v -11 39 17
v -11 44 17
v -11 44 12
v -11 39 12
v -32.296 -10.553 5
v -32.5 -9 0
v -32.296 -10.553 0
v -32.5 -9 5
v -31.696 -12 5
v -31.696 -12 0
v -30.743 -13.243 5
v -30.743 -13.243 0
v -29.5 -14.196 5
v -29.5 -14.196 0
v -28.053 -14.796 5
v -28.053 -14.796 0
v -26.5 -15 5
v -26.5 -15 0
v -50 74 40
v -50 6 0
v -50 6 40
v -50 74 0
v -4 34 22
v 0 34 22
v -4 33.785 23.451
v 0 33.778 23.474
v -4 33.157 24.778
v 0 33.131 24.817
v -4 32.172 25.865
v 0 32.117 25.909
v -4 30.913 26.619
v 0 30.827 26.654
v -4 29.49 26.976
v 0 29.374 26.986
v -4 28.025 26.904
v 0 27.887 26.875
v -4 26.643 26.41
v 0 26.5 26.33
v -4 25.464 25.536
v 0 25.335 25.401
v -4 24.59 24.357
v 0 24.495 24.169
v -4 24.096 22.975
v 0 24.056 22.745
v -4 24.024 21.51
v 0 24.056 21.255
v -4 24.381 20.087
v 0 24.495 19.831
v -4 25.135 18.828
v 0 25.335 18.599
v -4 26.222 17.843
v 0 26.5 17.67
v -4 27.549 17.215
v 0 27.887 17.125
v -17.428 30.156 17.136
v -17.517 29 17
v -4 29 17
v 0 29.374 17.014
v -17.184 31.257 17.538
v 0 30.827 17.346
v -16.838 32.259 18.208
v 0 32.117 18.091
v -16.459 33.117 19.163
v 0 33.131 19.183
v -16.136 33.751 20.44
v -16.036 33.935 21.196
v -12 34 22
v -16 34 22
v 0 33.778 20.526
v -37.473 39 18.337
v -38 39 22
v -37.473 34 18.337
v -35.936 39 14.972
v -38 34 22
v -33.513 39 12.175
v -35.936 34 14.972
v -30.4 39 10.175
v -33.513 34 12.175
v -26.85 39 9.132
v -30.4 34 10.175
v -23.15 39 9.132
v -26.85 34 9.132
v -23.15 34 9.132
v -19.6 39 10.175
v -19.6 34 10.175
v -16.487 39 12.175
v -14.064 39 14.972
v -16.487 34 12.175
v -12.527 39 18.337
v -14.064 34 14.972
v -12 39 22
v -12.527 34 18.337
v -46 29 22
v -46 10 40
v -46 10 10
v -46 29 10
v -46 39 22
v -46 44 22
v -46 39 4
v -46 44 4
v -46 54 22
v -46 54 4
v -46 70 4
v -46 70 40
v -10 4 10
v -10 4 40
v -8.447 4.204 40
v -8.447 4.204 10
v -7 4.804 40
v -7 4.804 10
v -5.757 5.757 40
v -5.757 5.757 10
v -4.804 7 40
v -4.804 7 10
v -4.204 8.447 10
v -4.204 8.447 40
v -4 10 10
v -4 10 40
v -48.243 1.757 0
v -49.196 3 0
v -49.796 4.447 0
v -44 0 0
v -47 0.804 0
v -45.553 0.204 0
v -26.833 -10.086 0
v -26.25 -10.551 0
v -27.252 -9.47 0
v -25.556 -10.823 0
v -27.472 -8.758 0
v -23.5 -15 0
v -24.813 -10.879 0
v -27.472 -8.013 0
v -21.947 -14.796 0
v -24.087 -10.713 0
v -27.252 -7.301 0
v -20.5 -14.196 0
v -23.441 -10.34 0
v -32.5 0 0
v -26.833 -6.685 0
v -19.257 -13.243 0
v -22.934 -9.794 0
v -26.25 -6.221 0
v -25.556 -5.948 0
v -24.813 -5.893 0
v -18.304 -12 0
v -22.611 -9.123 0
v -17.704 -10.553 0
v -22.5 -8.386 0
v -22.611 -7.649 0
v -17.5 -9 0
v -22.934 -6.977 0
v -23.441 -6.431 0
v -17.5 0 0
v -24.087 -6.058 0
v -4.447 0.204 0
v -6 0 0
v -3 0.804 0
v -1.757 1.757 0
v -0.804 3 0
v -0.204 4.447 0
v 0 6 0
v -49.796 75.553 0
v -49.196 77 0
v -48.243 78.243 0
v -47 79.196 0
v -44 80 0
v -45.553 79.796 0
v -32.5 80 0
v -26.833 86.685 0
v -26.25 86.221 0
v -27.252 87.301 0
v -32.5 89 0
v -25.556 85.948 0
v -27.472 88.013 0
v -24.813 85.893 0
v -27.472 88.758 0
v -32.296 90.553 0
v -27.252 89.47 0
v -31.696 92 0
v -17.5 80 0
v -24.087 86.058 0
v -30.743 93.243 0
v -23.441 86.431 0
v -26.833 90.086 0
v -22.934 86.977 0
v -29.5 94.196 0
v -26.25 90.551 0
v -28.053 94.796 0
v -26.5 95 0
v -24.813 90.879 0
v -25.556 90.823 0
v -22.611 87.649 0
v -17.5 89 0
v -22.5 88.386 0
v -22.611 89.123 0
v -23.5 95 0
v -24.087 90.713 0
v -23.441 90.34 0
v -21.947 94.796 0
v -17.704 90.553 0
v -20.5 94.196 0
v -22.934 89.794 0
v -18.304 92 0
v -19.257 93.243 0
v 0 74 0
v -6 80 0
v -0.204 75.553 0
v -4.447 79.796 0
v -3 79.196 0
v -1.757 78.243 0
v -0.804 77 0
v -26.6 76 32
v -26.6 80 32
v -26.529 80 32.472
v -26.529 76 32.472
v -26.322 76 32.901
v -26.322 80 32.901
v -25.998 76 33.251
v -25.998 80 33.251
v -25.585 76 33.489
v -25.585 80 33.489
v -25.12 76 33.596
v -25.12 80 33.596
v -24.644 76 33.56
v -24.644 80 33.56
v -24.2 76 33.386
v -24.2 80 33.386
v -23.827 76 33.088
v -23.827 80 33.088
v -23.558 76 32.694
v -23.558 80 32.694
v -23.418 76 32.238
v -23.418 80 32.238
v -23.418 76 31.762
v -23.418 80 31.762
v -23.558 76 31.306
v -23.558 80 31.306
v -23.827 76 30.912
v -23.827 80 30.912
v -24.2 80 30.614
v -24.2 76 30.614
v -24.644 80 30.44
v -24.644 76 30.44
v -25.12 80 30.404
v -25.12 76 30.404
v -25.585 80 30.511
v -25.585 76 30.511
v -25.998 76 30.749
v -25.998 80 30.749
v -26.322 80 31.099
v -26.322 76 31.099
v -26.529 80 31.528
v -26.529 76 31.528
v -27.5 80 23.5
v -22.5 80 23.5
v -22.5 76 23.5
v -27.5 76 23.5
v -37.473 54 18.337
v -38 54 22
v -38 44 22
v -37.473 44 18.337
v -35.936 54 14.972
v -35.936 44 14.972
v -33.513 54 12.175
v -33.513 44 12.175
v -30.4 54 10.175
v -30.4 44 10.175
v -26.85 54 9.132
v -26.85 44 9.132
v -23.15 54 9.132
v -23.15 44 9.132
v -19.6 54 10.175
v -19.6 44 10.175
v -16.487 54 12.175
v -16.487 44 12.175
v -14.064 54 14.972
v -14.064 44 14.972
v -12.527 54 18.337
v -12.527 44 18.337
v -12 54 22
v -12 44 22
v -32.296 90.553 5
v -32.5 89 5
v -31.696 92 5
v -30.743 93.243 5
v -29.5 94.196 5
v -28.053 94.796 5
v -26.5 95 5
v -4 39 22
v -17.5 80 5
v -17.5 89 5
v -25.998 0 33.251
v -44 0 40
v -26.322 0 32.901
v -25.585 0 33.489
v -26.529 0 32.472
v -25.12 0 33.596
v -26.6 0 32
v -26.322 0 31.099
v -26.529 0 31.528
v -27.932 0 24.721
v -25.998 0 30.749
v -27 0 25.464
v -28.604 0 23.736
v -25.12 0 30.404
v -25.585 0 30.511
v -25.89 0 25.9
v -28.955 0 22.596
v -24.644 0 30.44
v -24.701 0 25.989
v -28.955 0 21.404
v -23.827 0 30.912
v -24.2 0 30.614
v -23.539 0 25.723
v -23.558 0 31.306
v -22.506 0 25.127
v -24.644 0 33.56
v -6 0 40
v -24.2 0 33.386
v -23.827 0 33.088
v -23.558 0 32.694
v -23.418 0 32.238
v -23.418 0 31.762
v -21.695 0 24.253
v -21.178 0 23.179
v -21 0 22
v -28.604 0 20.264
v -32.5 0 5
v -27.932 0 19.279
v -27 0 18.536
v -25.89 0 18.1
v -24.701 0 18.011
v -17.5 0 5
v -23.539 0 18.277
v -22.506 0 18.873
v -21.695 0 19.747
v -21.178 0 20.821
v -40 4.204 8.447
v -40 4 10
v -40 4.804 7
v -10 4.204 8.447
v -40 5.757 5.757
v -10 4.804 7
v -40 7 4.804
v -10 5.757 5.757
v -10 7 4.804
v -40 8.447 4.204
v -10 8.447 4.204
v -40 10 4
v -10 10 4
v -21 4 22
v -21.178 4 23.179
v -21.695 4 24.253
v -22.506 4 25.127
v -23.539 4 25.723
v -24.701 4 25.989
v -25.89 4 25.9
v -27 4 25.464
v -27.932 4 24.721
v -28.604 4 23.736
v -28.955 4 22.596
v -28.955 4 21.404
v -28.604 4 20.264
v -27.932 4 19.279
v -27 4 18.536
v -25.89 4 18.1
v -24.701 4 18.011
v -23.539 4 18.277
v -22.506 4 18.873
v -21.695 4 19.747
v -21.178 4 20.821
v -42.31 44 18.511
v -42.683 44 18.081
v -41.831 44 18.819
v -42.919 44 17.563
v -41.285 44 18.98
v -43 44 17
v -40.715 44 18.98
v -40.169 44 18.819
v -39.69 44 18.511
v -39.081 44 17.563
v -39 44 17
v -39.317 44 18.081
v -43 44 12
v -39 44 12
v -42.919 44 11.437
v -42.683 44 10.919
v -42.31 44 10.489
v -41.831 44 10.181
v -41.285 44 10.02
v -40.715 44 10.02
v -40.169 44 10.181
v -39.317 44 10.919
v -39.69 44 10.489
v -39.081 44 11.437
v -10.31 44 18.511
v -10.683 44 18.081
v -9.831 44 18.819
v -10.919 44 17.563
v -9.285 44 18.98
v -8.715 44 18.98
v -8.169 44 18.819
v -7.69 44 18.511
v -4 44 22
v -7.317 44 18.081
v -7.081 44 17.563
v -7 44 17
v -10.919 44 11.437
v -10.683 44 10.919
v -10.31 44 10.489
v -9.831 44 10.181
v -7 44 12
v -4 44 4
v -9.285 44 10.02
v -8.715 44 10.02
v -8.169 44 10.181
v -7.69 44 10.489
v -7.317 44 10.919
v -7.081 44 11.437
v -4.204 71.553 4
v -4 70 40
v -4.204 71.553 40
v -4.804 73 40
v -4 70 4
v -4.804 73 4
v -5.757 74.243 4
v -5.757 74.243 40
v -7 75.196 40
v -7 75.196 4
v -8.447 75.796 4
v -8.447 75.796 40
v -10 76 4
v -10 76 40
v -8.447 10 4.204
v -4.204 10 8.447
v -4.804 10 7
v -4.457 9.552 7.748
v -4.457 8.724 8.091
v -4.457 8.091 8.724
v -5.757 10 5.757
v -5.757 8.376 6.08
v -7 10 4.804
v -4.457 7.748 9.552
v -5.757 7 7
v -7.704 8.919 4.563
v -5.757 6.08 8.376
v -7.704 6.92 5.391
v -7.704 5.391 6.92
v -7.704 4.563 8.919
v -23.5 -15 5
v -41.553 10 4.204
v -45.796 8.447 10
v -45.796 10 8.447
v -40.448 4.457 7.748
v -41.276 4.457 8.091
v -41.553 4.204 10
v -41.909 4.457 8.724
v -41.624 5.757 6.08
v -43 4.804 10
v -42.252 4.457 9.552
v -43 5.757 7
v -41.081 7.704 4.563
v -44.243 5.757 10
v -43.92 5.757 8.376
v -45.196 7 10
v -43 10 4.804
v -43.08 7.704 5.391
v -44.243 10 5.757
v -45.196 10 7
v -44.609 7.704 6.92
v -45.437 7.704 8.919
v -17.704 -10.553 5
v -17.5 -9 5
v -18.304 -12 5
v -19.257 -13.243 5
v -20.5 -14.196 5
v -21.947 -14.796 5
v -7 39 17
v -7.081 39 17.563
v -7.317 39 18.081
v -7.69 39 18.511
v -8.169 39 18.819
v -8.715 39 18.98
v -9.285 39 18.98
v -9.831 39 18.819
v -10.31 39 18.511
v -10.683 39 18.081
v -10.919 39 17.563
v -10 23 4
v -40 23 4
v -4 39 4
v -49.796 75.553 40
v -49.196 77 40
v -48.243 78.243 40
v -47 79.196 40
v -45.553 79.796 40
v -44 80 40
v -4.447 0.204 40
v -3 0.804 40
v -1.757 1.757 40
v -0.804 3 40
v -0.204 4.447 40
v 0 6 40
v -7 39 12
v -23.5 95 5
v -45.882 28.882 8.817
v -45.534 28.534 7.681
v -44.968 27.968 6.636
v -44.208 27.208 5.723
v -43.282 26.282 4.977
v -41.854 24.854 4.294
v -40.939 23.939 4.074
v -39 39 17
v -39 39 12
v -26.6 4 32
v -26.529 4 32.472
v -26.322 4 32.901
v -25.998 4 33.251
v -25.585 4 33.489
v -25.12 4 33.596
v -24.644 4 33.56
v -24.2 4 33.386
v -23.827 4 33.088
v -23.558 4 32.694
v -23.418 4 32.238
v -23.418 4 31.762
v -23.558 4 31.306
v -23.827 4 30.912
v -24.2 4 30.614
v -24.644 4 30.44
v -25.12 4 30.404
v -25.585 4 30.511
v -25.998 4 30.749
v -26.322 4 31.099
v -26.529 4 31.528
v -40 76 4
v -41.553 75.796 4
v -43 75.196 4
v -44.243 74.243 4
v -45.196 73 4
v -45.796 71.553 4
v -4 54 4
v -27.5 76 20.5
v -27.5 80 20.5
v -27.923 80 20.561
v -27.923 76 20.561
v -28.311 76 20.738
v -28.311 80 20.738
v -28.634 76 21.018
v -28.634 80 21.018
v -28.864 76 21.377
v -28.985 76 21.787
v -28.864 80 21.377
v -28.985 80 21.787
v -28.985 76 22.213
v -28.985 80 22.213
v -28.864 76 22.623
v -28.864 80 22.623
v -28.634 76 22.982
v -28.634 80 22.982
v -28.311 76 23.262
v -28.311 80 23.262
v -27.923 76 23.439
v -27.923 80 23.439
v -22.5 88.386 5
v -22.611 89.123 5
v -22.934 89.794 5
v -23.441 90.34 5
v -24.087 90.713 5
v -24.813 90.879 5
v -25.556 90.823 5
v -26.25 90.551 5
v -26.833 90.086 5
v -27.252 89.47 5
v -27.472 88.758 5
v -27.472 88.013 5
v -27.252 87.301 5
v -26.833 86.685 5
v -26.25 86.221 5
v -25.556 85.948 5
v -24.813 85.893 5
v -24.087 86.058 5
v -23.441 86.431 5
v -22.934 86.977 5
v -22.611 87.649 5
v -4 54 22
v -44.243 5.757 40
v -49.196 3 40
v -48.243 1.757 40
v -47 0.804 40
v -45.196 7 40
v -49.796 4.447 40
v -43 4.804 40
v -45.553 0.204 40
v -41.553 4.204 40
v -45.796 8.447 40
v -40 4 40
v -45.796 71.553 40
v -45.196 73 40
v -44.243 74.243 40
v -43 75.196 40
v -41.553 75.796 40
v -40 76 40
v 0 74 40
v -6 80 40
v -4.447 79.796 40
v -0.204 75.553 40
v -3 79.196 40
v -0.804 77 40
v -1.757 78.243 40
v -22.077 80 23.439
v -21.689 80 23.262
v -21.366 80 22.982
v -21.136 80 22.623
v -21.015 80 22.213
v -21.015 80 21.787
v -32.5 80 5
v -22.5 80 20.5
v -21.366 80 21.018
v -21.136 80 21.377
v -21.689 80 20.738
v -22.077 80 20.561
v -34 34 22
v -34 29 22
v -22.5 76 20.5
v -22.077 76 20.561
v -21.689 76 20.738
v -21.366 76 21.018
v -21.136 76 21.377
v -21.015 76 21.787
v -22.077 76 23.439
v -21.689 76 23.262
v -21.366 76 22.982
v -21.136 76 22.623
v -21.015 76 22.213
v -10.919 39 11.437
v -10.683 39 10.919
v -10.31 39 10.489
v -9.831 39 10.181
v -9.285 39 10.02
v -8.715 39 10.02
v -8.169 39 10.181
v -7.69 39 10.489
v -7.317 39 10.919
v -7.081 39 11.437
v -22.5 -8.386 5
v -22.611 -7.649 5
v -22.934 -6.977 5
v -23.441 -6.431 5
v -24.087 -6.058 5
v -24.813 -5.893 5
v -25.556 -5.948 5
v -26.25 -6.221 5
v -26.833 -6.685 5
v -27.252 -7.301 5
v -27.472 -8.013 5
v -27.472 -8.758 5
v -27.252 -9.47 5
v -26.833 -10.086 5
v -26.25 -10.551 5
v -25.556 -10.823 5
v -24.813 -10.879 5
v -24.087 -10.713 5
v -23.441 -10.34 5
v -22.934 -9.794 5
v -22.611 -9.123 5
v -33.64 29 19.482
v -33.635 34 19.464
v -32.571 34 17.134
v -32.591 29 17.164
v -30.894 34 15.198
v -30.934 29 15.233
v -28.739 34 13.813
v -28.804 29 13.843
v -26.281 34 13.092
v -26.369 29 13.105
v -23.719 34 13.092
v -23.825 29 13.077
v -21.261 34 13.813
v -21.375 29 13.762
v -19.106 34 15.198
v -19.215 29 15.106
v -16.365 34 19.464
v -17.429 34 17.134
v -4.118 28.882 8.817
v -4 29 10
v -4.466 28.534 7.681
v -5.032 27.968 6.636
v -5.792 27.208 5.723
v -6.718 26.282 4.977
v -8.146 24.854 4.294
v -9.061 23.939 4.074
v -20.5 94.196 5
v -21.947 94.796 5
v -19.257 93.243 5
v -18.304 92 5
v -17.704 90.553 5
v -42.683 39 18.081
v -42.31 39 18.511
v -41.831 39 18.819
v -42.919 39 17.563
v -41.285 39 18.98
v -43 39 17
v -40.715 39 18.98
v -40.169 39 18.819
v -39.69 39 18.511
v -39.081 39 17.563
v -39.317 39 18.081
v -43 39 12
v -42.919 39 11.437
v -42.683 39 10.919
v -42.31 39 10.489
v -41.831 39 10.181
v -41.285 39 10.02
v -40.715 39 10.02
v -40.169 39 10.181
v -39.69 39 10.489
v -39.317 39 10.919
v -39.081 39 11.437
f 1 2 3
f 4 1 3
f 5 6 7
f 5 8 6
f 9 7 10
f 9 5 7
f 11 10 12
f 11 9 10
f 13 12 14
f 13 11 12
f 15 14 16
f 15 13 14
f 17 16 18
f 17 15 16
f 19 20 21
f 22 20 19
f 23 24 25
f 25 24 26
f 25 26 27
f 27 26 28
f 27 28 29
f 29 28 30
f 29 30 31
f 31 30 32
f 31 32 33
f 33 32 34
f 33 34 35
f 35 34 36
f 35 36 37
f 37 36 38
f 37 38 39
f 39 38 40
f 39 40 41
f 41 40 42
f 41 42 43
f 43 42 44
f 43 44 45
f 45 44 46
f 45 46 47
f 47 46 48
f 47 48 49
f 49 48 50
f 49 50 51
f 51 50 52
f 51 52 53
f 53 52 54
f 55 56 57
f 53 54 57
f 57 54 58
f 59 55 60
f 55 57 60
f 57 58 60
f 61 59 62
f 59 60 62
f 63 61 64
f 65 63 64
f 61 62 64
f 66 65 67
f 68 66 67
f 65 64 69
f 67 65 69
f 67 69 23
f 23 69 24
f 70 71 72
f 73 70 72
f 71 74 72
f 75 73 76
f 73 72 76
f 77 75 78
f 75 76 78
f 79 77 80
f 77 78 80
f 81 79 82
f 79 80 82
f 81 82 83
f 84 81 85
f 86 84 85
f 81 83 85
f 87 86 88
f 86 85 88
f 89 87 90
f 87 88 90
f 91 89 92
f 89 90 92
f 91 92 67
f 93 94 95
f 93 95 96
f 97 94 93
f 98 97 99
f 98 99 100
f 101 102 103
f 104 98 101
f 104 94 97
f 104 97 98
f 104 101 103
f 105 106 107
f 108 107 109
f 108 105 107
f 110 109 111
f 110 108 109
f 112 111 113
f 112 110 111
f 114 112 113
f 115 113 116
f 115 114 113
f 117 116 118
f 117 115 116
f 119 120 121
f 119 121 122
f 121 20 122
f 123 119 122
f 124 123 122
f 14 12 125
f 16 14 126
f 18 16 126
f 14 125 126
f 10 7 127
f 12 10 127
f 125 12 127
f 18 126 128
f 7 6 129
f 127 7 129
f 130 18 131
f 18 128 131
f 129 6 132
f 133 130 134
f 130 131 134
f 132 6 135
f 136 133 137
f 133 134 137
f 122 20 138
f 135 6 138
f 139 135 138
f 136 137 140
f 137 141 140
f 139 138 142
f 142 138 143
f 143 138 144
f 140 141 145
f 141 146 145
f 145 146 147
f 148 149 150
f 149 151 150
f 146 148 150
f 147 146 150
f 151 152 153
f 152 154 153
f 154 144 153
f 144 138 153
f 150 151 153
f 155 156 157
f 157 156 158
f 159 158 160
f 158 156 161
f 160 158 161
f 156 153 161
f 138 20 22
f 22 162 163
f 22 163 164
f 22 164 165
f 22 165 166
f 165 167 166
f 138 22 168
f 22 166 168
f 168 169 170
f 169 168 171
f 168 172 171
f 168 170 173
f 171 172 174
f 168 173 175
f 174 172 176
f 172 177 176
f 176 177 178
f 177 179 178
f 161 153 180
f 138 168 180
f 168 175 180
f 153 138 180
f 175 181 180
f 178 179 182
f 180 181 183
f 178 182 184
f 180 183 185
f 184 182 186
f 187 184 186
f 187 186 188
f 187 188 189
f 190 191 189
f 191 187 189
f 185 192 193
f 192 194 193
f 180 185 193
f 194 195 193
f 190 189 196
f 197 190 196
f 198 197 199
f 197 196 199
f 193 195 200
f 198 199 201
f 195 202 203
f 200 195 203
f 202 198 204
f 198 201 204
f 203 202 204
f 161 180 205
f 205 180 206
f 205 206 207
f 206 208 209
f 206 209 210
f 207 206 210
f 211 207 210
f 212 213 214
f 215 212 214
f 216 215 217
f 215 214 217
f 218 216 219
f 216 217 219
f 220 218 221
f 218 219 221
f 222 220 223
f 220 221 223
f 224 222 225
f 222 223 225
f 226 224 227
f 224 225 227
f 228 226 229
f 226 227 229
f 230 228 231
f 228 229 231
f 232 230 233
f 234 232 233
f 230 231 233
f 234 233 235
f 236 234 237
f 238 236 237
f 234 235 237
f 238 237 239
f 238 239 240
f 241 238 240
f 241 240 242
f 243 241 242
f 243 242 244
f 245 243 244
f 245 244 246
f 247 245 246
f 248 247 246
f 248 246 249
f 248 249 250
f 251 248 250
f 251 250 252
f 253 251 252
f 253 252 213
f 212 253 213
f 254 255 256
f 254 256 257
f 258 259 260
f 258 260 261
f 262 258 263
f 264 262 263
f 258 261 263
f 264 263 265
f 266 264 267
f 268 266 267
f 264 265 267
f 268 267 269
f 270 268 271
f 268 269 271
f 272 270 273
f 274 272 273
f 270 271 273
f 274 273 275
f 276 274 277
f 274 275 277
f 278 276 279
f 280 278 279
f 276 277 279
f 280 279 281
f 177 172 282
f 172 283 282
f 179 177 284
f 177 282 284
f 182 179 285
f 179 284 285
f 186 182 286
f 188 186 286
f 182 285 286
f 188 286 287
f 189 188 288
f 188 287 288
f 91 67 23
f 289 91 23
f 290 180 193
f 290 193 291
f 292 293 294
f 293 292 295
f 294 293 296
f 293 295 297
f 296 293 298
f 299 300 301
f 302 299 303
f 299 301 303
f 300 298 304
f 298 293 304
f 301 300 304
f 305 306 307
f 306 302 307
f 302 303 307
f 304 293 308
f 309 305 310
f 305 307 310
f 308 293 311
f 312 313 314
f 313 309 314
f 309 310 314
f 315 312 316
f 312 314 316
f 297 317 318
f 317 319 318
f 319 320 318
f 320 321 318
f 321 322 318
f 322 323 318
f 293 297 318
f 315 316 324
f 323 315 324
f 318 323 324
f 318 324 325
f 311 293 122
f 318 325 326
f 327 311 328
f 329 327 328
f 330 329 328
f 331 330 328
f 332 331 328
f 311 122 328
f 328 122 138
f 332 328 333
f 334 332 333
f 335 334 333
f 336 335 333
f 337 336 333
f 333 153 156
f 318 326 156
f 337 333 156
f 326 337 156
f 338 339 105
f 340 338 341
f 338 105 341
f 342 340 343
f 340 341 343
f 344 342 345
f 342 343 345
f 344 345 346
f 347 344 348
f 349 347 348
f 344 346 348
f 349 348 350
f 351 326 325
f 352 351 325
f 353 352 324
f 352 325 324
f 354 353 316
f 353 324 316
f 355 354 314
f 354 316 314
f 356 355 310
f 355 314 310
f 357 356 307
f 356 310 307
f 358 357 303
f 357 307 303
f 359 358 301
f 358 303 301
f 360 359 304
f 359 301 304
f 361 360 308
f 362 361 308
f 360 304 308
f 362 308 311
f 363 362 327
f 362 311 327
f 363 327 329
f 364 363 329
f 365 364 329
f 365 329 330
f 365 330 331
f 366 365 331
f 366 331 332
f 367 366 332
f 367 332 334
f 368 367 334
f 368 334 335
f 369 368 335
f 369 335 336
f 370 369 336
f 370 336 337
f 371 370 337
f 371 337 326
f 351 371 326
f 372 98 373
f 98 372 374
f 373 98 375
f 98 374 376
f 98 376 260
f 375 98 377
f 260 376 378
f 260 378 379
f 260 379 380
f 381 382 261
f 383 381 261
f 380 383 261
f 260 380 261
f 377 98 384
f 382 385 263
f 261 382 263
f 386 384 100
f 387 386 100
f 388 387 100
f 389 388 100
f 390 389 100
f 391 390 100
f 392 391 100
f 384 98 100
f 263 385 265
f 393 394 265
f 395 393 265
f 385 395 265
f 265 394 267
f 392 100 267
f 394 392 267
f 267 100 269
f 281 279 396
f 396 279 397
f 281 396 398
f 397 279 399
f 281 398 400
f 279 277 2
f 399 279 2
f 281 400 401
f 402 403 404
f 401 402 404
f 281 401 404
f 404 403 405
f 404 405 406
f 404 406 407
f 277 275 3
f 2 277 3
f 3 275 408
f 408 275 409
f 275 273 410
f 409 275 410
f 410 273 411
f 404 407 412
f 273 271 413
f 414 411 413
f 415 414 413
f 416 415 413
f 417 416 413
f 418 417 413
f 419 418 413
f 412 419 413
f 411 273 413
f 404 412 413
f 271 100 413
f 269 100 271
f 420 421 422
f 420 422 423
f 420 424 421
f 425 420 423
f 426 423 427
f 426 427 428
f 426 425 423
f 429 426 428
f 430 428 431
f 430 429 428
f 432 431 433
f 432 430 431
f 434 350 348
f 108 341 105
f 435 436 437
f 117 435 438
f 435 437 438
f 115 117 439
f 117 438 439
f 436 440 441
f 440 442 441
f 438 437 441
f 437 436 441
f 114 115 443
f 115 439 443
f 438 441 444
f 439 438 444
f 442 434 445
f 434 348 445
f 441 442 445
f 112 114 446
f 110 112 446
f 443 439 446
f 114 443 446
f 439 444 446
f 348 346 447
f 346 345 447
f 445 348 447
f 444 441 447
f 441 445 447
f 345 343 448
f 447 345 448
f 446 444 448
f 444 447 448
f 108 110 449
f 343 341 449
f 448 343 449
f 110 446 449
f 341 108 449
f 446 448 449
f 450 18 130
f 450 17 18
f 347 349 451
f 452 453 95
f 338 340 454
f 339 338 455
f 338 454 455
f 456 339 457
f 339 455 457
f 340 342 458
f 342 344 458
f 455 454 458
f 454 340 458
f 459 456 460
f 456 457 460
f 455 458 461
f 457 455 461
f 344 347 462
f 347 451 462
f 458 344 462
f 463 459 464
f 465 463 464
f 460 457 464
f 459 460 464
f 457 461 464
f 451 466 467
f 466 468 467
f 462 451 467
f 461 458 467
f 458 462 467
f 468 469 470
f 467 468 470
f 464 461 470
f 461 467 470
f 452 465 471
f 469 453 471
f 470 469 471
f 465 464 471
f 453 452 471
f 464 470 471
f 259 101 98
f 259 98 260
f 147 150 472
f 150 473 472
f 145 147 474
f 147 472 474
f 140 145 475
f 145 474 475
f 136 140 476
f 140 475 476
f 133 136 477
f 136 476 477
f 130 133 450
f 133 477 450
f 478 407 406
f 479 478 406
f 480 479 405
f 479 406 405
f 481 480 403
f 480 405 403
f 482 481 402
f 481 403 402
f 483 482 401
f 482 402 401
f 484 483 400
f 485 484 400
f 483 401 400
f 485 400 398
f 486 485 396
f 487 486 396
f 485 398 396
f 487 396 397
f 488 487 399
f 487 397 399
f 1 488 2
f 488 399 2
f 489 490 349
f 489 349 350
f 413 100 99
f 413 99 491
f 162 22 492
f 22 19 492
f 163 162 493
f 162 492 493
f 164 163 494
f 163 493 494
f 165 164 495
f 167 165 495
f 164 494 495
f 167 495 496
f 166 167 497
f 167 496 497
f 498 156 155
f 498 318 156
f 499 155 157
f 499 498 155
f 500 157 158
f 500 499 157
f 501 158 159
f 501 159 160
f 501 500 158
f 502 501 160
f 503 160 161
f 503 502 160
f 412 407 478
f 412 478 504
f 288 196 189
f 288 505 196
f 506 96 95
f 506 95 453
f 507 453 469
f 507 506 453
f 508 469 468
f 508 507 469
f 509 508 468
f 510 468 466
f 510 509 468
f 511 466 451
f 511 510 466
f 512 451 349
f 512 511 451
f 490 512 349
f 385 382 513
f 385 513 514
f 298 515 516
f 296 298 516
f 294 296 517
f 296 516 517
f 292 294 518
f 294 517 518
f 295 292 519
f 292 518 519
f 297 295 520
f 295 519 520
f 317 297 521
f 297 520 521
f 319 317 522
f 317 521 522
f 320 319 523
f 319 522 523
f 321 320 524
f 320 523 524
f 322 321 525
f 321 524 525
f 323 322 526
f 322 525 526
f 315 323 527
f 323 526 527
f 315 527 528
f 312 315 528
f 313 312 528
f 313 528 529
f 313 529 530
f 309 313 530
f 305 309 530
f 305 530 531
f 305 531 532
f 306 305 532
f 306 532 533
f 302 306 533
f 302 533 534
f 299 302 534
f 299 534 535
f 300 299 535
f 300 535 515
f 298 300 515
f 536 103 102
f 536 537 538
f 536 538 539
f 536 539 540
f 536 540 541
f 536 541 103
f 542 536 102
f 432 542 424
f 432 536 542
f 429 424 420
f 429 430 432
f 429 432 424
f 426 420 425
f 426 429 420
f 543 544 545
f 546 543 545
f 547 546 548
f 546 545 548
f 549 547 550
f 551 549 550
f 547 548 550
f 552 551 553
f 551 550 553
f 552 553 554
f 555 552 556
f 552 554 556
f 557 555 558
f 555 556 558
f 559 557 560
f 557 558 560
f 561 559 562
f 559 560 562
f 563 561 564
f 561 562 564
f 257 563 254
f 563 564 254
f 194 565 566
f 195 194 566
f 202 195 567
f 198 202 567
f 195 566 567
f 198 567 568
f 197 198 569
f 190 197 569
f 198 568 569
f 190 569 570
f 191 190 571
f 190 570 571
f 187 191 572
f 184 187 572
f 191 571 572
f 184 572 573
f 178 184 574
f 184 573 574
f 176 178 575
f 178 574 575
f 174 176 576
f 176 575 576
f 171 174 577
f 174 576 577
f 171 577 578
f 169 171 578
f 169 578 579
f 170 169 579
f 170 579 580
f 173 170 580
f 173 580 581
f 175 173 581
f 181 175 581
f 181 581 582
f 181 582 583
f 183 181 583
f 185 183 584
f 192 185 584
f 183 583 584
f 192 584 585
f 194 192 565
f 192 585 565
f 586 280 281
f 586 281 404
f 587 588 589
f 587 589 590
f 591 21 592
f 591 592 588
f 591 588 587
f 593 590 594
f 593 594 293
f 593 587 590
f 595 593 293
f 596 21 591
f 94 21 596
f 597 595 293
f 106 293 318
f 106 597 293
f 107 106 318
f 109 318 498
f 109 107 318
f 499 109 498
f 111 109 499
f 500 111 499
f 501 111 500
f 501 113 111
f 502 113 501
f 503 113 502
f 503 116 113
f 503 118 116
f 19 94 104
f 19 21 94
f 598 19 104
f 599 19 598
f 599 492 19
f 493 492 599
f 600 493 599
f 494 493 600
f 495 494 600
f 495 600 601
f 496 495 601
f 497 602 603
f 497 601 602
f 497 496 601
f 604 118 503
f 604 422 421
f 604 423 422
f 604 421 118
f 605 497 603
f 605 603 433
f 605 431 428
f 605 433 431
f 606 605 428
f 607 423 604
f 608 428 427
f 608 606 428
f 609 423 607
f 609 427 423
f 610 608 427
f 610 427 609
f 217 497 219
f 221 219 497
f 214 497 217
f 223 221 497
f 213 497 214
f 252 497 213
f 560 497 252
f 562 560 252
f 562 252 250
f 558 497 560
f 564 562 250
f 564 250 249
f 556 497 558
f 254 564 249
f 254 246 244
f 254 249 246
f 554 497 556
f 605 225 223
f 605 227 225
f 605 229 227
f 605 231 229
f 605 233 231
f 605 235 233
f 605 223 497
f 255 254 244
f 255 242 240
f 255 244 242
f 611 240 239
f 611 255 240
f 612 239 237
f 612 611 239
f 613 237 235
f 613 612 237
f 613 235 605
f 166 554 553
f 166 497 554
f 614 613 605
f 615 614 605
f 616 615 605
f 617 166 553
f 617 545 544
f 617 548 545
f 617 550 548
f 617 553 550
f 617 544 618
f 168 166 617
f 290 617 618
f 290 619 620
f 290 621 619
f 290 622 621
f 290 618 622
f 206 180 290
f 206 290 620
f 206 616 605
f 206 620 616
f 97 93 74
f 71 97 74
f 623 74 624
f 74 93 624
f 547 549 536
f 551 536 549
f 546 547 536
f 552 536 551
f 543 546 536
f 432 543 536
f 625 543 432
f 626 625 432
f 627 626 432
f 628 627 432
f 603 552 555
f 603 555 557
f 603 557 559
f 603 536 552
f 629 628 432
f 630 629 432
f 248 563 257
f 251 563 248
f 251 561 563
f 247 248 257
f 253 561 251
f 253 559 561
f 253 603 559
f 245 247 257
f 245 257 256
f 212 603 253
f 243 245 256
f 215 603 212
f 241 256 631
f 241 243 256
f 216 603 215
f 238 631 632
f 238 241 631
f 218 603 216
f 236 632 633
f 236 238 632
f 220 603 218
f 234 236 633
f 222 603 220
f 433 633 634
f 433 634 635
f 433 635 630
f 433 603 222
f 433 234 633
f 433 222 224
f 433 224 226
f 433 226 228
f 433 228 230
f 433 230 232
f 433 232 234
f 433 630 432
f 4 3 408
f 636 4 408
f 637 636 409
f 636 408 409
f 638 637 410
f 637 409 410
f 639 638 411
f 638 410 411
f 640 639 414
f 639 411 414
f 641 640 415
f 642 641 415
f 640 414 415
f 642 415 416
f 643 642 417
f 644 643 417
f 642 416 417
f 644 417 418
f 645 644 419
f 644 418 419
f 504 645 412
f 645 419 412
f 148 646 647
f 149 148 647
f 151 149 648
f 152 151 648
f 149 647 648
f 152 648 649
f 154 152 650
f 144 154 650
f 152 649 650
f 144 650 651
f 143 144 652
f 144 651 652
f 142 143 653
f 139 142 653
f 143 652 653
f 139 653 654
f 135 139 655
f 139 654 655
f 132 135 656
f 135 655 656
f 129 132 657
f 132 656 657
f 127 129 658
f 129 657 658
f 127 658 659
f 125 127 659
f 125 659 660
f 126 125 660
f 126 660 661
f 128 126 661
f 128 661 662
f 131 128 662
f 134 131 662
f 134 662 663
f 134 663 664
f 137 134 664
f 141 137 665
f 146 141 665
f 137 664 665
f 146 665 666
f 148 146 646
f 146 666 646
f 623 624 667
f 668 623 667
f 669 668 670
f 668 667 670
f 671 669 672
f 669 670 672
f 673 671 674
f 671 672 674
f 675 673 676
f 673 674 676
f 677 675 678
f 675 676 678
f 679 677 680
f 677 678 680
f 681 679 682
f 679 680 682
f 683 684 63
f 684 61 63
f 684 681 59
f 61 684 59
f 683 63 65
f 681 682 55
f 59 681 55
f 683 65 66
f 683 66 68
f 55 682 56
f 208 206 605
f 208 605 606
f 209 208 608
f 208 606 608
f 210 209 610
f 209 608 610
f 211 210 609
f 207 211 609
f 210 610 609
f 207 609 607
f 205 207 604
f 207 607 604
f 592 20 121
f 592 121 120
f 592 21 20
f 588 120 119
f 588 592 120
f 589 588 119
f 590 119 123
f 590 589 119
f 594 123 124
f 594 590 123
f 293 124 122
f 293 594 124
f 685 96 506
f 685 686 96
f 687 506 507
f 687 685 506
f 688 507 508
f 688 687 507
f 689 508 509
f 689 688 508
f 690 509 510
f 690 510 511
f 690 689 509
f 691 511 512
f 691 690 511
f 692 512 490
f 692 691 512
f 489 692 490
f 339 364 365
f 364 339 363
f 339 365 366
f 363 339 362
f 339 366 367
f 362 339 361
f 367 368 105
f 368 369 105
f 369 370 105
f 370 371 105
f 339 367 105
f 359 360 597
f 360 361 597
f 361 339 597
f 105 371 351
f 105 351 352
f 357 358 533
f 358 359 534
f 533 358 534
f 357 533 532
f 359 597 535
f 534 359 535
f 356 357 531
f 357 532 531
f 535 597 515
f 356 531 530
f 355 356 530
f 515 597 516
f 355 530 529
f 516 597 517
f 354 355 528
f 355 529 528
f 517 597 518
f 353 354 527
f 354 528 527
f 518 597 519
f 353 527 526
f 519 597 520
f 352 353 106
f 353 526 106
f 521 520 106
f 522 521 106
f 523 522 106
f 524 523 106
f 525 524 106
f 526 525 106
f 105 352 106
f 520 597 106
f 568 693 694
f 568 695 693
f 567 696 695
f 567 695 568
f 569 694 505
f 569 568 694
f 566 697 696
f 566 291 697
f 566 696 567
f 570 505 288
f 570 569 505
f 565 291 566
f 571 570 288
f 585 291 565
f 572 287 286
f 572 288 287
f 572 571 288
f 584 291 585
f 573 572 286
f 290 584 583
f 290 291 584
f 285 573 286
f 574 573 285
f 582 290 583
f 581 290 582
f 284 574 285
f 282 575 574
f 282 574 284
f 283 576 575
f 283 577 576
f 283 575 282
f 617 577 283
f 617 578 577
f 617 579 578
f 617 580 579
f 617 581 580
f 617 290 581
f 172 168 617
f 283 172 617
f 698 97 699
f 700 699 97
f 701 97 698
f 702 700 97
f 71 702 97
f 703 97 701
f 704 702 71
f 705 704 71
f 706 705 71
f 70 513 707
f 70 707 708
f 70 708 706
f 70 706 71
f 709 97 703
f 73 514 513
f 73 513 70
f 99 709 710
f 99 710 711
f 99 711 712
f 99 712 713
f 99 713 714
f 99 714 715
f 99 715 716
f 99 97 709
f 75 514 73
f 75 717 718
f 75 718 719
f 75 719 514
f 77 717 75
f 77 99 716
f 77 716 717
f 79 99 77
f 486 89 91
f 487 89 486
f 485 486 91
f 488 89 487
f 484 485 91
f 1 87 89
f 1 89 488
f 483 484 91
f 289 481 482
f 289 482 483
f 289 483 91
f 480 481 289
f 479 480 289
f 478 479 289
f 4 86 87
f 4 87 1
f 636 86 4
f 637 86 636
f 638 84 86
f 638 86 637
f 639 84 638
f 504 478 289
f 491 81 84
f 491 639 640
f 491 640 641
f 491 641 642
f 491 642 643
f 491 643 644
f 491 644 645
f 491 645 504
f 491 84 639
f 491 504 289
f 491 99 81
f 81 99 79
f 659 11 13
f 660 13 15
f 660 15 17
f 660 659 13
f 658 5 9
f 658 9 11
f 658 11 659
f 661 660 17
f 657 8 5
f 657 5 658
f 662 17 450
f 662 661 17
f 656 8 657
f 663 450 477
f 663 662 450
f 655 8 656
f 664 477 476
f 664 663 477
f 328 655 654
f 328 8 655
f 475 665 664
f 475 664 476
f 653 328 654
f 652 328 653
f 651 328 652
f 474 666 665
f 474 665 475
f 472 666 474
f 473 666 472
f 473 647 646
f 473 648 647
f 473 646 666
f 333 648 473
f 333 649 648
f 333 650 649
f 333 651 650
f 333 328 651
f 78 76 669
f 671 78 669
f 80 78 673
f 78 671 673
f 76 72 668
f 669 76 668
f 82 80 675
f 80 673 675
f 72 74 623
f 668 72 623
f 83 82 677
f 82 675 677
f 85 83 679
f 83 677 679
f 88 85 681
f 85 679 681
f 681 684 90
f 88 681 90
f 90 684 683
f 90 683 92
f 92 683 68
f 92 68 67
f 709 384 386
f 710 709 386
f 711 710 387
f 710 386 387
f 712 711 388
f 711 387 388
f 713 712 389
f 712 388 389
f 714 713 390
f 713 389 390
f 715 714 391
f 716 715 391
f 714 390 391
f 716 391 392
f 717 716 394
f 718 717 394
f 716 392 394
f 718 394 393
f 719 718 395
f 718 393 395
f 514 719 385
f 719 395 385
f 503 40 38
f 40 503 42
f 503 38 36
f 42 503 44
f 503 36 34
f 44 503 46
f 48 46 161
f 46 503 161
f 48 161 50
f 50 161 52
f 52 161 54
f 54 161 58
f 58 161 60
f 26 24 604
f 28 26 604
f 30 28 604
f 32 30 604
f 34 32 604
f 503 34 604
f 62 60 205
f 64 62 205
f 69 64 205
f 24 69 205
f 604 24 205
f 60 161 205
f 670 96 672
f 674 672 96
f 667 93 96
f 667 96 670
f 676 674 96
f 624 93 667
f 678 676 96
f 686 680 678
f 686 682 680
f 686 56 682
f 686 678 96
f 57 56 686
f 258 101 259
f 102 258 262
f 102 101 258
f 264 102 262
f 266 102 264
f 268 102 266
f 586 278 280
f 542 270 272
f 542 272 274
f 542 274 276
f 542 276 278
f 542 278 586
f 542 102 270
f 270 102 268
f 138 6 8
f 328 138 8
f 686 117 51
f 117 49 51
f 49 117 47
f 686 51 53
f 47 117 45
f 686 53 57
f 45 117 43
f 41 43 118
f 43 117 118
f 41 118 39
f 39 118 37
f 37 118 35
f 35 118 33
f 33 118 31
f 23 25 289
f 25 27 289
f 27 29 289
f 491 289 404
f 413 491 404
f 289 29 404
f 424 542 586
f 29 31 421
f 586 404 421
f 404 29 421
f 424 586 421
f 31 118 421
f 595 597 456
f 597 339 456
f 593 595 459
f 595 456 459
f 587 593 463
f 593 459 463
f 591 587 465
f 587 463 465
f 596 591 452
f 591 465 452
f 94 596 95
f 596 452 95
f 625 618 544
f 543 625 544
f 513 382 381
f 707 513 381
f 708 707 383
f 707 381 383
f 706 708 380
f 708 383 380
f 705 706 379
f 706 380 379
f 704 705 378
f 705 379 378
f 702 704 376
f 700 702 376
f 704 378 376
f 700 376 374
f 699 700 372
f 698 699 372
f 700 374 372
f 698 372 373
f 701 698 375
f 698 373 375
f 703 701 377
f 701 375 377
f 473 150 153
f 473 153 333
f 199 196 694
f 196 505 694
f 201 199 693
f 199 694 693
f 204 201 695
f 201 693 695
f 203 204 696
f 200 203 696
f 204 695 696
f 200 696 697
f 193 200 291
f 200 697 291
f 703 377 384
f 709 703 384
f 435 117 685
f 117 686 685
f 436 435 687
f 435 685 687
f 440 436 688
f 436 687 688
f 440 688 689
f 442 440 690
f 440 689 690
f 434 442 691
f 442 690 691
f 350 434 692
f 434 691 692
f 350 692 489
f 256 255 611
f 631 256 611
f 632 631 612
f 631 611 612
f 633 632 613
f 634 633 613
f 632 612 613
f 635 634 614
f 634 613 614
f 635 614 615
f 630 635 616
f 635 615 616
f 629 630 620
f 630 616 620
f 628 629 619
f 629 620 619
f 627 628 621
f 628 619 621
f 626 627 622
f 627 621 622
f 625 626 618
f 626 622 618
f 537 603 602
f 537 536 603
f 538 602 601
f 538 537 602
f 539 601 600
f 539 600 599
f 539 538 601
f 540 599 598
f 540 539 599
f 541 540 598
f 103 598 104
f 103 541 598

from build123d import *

# Parameters (mm, degrees)
SKETCH_W        = 50
SKETCH_H        = 80
PAD_DEPTH       = 40
SKETCH001_W     = 42
SKETCH001_H     = 72
POCKET_DEPTH    = 36
SKETCH002_W     = 42
SKETCH002_H     = 10
PAD001_DEPTH    = 18
SKETCH003_R     = 13
POCKET001_DEPTH = 30
SKETCH004_W     = 42
SKETCH004_H     = 10
PAD002_DEPTH    = 18
SKETCH005_R     = 13
POCKET002_DEPTH = 10
PAD003_DEPTH    = 5
PAD004_DEPTH    = 5
SKETCH008_R     = 5
POCKET003_DEPTH = 19
POCKET004_DEPTH = 5
SKETCH010_R     = 4
POCKET005_DEPTH = 5
SKETCH011_W     = 15
SKETCH011_H     = 5
PAD005_DEPTH    = 15
SKETCH012_W     = 15
SKETCH012_H     = 5
PAD006_DEPTH    = 15
SKETCH013_R     = 2.5
POCKET006_DEPTH = 5
FILLET_R        = 6
FILLET001_R     = 6
FILLET002_R     = 6
SKETCH014_R     = 1.6
POCKET007_DEPTH = 95.001


with BuildPart() as part:
    # Sketch → Pad (new body)
    with BuildSketch(Plane.XY):
        with Locations((-25, 40)):
            Rectangle(SKETCH_W, SKETCH_H)
    extrude(amount=PAD_DEPTH)

    # Sketch001 (on Face6 of Pad) → Pocket (cut)
    with BuildSketch(Plane.XY.offset(40)):
        with Locations((-25, 40)):
            Rectangle(SKETCH001_W, SKETCH001_H)
    extrude(amount=-POCKET_DEPTH, mode=Mode.SUBTRACT)

    # Sketch002 (on Face11 of Pocket) → Pad001 (join)
    with BuildSketch(Plane.XY.offset(4)):
        with Locations((-25, 34)):
            Rectangle(SKETCH002_W, SKETCH002_H)
    extrude(amount=PAD001_DEPTH)

    # Sketch003 (on Face13 of Pad001) → Pocket001 (cut)
    with BuildSketch(Plane.XZ.offset(-29)):
        with Locations((-25, 22)):
            Circle(SKETCH003_R)
    extrude(amount=-POCKET001_DEPTH, mode=Mode.SUBTRACT)

    # Sketch004 (on Face11 of Pocket001) → Pad002 (join)
    with BuildSketch(Plane.XY.offset(4)):
        with Locations((-25, 49)):
            Rectangle(SKETCH004_W, SKETCH004_H)
    extrude(amount=PAD002_DEPTH)

    # Sketch005 (on Face17 of Pad002) → Pocket002 (cut)
    with BuildSketch(Plane.XZ.offset(-44)):
        with Locations((-25, 22)):
            Circle(SKETCH005_R)
    extrude(amount=-POCKET002_DEPTH, mode=Mode.SUBTRACT)

    # Sketch006 (on Face17 of Pocket002) → Pad003 (join)
    with BuildSketch(Plane.XZ.offset(-44)):
        with BuildLine():
            ThreePointArc((-39, 17), (-41, 19), (-43, 17))
            Line((-43, 17), (-43, 12))
            ThreePointArc((-43, 12), (-41, 10), (-39, 12))
            Line((-39, 17), (-39, 12))
        make_face()
        with BuildLine():
            ThreePointArc((-7, 17), (-9, 19), (-11, 17))
            Line((-11, 17), (-11, 12))
            ThreePointArc((-11, 12), (-9, 10), (-7, 12))
            Line((-7, 17), (-7, 12))
        make_face()
    extrude(amount=PAD003_DEPTH)

    # Sketch007 (on Face13 of Pad003) → Pad004 (join)
    with BuildSketch(Plane.XZ.offset(-29)):
        with BuildLine():
            ThreePointArc((-38, 22), (-25, 9), (-12, 22))
            Line((-16, 22), (-12, 22))
            ThreePointArc((-34, 22), (-25, 13), (-16, 22))
            Line((-38, 22), (-34, 22))
        make_face()
    extrude(amount=-PAD004_DEPTH)

    # Sketch008 (on Face2 of Pad004) → Pocket003 (cut)
    with BuildSketch(Plane.YZ):
        with Locations((29, 22)):
            Circle(SKETCH008_R)
    extrude(amount=-POCKET003_DEPTH, mode=Mode.SUBTRACT)

    # Sketch009 (on Face6 of Pocket003) → Pocket004 (cut)
    with BuildSketch(Plane(origin=(0, 80, 0), x_dir=(-1, 0, 0), z_dir=(0, 1, 0))):
        with BuildLine():
            ThreePointArc((22.5, 23.5), (21, 22), (22.5, 20.5))
            Line((22.5, 20.5), (27.5, 20.5))
            ThreePointArc((27.5, 20.5), (29, 22), (27.5, 23.5))
            Line((22.5, 23.5), (27.5, 23.5))
        make_face()
    extrude(amount=-POCKET004_DEPTH, mode=Mode.SUBTRACT)

    # Sketch010 (on Face1 of Pocket004) → Pocket005 (cut)
    with BuildSketch(Plane.XZ):
        with Locations((-25, 22)):
            Circle(SKETCH010_R)
    extrude(amount=-POCKET005_DEPTH, mode=Mode.SUBTRACT)

    # Sketch011 (on Face7 of Pocket005) → Pad005 (join)
    with BuildSketch(Plane(origin=(0, 80, 0), x_dir=(-1, 0, 0), z_dir=(0, 1, 0))):
        with Locations((25, 2.5)):
            Rectangle(SKETCH011_W, SKETCH011_H)
    extrude(amount=PAD005_DEPTH)

    # Sketch012 (on Face1 of Pad005) → Pad006 (join)
    with BuildSketch(Plane.XZ):
        with Locations((-25, 2.5)):
            Rectangle(SKETCH012_W, SKETCH012_H)
    extrude(amount=PAD006_DEPTH)

    # Sketch013 (on Face20 of Pad006) → Pocket006 (cut)
    with BuildSketch(Plane.XY.offset(5)):
        with Locations((-25, 88.385622)):
            Circle(SKETCH013_R)
        with Locations((-25, -8.385622)):
            Circle(SKETCH013_R)
    extrude(amount=-POCKET006_DEPTH, mode=Mode.SUBTRACT)

    # Fillet
    fillet_edges = [part.edges().sort_by_distance(p)[0] for p in [
        (-32.5, -15, 2.5),
        (-17.5, -15, 2.5),
        (-32.5, 95, 2.5),
        (-17.5, 95, 2.5),
    ]]
    fillet(fillet_edges, radius=FILLET_R)

    # Fillet001
    fillet001_edges = [part.edges().sort_by_distance(p)[0] for p in [
        (-46, 16.5, 4),
        (-25, 4, 4),
        (-4, 16.5, 4),
        (-25, 29, 4),
        (-46, 4, 22),
        (-46, 76, 22),
        (-4, 76, 22),
        (-4, 4, 22),
    ]]
    fillet(fillet001_edges, radius=FILLET001_R)

    # Fillet002
    fillet002_edges = [part.edges().sort_by_distance(p)[0] for p in [
        (0, 0, 20),
        (-50, 0, 20),
        (-50, 80, 20),
        (0, 80, 20),
    ]]
    fillet(fillet002_edges, radius=FILLET002_R)

    # Sketch014 (on Face9 of Fillet002) → Pocket007 (cut, through all)
    with BuildSketch(Plane(origin=(0, 80, 0), x_dir=(-1, 0, 0), z_dir=(0, 1, 0))):
        with Locations((25, 32)):
            Circle(SKETCH014_R)
    extrude(amount=-POCKET007_DEPTH, mode=Mode.SUBTRACT)


solid = part.part
